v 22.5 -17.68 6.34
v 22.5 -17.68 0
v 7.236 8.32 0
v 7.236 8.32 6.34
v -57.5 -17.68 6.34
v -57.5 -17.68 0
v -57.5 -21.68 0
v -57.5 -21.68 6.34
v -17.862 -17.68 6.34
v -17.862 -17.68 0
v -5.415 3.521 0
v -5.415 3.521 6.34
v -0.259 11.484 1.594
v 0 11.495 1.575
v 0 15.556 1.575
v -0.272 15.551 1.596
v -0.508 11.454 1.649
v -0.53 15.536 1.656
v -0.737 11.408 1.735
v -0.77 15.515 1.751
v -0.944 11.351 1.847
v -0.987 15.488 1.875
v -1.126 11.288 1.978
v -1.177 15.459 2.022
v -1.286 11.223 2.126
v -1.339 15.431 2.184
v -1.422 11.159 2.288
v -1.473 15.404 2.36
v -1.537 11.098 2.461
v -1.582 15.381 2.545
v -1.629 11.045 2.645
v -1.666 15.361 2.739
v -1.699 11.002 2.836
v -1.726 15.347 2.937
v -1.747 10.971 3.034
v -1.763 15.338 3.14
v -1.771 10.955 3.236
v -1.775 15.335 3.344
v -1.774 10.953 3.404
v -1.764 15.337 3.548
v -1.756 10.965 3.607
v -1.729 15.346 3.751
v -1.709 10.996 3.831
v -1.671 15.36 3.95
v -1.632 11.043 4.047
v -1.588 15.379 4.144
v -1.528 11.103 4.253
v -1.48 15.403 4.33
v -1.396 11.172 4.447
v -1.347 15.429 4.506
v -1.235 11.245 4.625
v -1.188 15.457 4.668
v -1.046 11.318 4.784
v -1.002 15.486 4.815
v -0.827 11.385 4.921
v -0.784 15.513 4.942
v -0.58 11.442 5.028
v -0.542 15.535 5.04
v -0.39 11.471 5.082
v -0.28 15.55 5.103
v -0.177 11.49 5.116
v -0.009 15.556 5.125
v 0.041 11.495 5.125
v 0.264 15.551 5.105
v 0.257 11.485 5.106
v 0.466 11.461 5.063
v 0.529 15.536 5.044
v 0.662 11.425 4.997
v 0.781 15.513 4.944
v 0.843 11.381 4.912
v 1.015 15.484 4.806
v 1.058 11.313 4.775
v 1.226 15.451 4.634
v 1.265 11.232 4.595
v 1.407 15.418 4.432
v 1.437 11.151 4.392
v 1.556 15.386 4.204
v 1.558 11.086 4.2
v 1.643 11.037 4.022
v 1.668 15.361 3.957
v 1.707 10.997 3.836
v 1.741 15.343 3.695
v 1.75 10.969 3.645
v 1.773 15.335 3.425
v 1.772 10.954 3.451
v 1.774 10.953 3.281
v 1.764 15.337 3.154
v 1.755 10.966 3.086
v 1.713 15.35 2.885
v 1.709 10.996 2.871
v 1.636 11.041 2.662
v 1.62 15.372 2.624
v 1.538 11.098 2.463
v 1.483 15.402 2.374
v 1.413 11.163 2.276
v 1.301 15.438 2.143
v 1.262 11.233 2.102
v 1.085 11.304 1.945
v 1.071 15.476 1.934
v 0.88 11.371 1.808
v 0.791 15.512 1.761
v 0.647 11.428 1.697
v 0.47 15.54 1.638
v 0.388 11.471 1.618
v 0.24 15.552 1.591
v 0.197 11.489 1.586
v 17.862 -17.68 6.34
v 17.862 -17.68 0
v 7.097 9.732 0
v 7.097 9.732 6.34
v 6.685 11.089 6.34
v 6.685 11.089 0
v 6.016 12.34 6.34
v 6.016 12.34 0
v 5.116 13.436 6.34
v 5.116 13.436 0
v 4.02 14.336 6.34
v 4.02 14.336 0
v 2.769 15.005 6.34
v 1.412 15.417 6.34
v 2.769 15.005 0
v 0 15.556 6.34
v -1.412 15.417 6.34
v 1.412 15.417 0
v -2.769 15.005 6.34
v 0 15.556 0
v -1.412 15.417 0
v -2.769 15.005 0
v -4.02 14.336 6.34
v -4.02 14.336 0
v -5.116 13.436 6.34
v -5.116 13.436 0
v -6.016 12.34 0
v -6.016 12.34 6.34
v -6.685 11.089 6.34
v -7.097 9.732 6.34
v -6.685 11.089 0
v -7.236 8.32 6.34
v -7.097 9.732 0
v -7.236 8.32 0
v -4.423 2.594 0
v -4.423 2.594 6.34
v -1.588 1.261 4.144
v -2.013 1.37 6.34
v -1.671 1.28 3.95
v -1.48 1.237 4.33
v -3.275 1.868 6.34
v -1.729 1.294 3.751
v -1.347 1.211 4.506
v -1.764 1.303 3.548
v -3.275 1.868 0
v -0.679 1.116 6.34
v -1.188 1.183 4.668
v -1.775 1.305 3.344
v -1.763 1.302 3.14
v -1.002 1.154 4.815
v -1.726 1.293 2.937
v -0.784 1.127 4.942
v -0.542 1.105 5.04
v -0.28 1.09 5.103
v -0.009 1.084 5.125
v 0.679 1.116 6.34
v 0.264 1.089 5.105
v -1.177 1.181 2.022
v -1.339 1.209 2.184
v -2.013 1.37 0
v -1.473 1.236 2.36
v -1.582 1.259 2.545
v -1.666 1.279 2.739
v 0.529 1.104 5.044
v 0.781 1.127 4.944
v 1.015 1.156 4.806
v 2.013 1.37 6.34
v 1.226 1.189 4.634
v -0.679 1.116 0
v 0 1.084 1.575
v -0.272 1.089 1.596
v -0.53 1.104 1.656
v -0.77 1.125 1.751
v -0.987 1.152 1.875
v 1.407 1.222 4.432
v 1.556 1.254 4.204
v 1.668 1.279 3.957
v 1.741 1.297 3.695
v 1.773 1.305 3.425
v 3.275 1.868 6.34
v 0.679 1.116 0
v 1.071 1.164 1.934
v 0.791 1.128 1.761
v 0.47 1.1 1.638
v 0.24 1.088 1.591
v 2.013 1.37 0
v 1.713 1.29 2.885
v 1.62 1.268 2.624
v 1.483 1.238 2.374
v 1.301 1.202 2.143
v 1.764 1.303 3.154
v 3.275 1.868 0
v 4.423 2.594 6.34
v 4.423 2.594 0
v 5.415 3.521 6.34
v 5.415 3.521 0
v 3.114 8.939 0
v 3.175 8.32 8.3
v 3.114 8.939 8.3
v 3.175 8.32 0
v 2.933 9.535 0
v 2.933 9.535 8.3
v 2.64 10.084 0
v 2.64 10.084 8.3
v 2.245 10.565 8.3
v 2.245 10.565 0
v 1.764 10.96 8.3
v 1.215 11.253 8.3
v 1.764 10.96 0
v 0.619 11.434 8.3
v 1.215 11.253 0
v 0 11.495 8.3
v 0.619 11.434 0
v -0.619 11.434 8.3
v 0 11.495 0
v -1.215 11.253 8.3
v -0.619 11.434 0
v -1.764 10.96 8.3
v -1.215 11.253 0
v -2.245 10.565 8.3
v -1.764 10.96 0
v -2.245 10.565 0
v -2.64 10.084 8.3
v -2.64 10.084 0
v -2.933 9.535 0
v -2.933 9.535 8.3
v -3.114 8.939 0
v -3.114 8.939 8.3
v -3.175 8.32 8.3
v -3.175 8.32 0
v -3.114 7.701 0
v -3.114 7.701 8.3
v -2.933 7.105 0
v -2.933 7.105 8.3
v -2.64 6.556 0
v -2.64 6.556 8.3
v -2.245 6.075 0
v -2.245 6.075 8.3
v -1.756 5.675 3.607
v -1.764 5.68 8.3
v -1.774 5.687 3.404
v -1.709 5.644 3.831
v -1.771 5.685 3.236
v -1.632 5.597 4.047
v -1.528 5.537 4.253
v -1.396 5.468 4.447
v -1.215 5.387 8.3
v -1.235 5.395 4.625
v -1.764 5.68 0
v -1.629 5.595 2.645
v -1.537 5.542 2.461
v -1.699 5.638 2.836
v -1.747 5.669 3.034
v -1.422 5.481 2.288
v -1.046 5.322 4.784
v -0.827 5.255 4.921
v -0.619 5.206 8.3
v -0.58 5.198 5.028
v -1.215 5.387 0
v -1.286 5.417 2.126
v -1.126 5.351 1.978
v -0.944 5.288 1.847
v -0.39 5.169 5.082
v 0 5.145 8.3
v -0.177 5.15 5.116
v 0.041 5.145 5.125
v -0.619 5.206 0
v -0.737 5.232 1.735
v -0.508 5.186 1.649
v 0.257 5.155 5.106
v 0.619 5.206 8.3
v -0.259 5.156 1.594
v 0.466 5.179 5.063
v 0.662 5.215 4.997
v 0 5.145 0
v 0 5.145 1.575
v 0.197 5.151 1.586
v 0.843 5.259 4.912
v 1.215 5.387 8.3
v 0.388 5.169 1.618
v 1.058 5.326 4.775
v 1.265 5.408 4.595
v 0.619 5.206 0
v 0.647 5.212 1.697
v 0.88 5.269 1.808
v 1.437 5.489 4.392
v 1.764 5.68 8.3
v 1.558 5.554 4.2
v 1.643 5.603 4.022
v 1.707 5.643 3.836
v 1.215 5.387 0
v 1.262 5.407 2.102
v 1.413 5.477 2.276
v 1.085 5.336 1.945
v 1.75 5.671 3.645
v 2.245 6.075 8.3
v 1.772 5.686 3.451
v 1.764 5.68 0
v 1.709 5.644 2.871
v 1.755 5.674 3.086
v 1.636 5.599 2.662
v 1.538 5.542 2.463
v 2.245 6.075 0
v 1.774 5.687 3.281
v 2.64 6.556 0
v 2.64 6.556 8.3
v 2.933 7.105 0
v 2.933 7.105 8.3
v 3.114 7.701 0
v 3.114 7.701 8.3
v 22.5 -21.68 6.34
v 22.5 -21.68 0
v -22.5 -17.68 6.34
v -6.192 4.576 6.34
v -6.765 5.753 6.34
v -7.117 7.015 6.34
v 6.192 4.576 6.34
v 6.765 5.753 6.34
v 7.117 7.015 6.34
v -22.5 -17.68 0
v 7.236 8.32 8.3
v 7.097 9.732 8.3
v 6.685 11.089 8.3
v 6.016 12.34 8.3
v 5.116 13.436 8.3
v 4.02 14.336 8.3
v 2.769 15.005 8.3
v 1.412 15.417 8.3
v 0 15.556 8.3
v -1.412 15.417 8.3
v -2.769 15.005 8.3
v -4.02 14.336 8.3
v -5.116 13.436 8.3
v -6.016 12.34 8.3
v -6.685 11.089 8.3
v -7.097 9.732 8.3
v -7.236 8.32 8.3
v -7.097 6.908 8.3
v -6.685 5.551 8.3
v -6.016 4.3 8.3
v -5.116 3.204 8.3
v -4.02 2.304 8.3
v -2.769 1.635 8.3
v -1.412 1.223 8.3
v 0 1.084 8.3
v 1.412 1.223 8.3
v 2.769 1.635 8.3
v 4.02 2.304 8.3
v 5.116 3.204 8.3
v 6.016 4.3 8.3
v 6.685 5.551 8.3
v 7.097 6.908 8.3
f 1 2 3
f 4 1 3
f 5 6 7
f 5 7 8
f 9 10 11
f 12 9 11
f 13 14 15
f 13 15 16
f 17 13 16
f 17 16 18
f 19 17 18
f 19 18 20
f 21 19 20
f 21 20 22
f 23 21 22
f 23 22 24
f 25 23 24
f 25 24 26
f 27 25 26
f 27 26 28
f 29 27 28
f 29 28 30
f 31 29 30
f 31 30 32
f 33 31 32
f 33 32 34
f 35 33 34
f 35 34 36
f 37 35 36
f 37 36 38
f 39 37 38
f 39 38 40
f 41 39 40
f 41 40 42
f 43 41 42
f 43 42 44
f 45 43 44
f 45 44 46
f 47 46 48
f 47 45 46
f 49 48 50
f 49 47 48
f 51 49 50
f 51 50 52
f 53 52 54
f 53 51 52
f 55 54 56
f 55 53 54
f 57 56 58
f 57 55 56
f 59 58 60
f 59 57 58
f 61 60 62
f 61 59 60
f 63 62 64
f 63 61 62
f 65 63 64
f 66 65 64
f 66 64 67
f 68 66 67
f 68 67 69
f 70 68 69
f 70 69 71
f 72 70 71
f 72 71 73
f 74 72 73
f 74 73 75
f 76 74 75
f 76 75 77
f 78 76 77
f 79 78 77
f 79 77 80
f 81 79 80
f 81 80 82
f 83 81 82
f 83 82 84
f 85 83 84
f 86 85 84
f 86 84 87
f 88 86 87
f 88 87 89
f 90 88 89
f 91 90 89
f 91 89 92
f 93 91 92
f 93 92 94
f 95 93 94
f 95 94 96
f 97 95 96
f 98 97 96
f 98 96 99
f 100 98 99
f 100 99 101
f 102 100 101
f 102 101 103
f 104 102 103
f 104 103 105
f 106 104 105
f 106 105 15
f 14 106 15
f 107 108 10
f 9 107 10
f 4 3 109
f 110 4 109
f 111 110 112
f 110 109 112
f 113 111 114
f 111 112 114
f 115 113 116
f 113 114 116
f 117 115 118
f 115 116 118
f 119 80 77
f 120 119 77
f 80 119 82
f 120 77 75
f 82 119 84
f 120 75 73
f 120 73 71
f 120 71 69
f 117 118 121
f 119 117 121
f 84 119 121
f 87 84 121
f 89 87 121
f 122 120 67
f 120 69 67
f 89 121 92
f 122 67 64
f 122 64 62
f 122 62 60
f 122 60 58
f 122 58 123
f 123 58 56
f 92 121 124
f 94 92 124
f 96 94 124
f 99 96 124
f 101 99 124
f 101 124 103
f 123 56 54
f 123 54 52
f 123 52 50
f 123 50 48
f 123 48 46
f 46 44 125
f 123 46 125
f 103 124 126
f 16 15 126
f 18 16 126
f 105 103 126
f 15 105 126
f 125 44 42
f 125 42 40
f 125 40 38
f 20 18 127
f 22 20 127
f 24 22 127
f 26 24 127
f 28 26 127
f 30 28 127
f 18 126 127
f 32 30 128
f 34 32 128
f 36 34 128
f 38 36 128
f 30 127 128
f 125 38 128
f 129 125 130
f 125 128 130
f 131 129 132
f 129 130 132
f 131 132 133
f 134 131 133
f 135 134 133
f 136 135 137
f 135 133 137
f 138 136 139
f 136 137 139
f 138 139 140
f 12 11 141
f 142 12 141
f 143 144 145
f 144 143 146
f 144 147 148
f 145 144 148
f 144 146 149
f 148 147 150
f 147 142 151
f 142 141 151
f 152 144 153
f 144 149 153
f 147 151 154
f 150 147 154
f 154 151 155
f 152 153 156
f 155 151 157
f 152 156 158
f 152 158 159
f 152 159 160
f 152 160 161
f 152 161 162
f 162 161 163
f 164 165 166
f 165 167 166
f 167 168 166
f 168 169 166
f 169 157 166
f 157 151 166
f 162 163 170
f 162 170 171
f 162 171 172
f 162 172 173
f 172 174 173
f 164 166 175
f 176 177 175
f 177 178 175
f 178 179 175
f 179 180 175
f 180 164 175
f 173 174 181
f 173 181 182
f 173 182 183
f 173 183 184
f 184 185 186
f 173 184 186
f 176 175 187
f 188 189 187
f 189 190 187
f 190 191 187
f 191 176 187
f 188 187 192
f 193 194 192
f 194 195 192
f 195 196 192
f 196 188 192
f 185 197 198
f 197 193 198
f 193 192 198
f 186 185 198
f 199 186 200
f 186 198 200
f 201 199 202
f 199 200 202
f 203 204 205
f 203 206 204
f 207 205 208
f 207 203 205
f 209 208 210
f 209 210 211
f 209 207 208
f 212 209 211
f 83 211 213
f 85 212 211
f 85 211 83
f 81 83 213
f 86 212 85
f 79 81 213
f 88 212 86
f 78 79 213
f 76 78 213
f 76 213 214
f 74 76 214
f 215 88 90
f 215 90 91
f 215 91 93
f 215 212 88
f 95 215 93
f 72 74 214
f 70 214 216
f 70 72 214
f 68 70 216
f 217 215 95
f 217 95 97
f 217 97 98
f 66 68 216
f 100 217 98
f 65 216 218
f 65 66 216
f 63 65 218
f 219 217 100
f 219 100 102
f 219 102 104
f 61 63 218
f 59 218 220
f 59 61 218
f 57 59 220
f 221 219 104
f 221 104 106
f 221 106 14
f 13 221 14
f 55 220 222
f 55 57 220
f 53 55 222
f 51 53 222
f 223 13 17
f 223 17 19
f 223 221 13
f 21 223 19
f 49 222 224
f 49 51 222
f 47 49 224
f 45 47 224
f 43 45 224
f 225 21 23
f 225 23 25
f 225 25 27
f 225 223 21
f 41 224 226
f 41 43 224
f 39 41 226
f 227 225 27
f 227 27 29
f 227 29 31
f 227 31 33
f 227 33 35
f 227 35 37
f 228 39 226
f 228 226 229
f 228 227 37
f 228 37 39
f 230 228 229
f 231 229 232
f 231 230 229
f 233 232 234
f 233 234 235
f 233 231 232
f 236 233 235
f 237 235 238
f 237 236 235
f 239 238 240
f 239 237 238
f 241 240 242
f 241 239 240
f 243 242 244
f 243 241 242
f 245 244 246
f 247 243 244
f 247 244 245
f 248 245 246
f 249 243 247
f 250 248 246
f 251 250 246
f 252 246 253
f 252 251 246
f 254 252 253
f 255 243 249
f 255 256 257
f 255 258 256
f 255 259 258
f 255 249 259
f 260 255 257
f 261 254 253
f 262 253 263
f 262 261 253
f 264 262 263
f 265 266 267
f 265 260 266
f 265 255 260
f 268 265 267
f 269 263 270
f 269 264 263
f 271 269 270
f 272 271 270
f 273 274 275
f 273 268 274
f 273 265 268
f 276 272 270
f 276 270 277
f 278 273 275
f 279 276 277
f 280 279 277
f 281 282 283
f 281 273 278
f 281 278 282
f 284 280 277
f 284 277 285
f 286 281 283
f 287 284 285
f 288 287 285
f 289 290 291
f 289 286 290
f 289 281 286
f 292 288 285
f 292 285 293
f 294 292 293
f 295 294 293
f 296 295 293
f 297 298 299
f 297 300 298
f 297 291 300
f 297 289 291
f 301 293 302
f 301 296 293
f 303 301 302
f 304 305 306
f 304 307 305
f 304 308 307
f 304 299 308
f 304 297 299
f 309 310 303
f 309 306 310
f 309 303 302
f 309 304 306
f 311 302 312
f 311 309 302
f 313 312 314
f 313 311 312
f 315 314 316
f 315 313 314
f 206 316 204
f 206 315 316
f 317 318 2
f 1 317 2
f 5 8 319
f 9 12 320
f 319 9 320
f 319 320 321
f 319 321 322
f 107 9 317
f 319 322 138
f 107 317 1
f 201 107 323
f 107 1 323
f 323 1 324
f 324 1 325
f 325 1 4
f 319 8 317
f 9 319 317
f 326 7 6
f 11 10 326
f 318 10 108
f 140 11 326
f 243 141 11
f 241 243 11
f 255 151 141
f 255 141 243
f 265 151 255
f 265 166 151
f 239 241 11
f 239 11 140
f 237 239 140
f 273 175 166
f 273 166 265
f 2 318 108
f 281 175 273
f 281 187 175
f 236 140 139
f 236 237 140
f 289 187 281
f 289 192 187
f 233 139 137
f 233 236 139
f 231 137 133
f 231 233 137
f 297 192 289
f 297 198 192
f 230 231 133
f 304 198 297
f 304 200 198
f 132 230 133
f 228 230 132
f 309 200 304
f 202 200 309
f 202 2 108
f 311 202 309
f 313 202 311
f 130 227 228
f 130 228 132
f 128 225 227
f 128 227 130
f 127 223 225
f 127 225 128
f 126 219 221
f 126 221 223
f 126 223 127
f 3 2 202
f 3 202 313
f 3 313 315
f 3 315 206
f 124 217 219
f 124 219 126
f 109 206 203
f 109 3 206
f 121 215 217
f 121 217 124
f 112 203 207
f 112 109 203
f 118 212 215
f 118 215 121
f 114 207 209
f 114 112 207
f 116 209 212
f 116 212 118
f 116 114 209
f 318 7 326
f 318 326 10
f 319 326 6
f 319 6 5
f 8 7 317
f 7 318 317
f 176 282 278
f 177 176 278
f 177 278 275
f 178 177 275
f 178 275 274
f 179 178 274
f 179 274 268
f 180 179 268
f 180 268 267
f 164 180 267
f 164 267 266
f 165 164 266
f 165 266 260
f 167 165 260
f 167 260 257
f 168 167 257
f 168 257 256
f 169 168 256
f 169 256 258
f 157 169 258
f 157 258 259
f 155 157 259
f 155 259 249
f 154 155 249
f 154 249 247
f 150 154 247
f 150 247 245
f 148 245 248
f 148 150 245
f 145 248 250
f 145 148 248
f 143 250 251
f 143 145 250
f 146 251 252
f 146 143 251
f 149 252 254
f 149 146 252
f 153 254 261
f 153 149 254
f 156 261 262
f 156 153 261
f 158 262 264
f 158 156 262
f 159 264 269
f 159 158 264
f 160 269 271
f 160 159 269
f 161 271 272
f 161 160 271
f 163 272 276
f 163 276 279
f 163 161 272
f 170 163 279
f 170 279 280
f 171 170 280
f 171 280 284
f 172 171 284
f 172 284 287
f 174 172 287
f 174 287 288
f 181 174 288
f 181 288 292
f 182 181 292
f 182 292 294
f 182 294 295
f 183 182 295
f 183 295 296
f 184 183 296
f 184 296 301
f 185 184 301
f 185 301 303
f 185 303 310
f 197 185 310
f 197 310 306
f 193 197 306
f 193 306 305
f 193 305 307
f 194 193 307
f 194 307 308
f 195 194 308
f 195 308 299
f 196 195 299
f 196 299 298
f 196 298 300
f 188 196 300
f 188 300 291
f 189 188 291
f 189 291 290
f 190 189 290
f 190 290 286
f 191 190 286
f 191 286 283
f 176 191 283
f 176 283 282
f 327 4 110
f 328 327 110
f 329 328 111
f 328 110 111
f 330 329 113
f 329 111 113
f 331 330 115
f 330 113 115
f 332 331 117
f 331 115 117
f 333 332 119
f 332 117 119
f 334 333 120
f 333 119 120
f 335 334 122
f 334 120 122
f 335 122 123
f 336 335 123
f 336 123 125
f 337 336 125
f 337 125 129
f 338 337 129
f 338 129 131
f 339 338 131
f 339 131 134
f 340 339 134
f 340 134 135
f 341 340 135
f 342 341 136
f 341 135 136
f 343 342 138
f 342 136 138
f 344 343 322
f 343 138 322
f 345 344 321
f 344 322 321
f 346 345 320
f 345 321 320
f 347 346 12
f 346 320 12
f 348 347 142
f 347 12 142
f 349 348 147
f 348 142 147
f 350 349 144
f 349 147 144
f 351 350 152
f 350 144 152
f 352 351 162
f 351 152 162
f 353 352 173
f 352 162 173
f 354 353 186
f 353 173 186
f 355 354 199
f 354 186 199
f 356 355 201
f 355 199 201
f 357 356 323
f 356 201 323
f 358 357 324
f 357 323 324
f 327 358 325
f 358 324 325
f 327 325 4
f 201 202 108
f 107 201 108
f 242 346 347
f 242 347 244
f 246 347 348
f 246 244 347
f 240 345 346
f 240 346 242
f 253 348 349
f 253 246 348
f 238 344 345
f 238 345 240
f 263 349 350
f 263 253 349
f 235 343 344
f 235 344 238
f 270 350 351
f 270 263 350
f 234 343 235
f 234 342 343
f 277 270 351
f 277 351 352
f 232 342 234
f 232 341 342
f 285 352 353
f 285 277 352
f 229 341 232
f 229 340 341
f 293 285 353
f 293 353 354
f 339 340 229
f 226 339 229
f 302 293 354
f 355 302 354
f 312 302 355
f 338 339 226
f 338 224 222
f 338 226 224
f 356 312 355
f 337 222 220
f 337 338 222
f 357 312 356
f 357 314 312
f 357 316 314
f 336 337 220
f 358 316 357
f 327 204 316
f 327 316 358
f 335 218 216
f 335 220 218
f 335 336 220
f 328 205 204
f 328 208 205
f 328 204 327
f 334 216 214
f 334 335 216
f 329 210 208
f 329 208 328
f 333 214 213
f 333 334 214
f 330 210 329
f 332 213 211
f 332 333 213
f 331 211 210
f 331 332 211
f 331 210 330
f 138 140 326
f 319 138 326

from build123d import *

# Parameters (mm, degrees)
SKETCH1_R               = 3.175
BOSS_EXTRUDE1_DEPTH     = 6.34
CUT_EXTRUDE1_DEPTH      = 4.34
CUT_EXTRUDE1_DEPTH_BACK = 18.34
SKETCH2_R               = 1.775
SKETCH5_R               = 7.235705293
SKETCH5_R_2             = 3.175
BOSS_EXTRUDE2_DEPTH     = 1.96
SKETCH6_W               = 6.34
SKETCH6_H               = 4
BOSS_EXTRUDE3_DEPTH     = 35


with BuildPart() as part:
    # Sketch1 → Boss-Extrude1 (new body)
    with BuildSketch(Plane.XY):
        with BuildLine():
            Line((-7.235705295, 8.319966171), (-22.5, -17.680033829))
            Line((-22.5, -17.680033829), (-22.5, -21.680033829))
            Line((-22.5, -21.680033829), (22.5, -21.680033829))
            Line((22.5, -21.680033829), (22.5, -17.680033829))
            Line((22.5, -17.680033829), (7.235705295, 8.319966171))
            ThreePointArc((7.235705293, 8.319966171), (0, 15.555671463), (-7.235705293, 8.319966171))
        make_face()
        with BuildLine():
            Line((-17.861599202, -17.680033829), (-5.414947439, 3.520614619))
            ThreePointArc((-5.414947439, 3.520614619), (0, 1.084260878), (5.414947439, 3.520614619))
            Line((5.414947439, 3.520614619), (17.861599202, -17.680033829))
            Line((17.861599202, -17.680033829), (-17.861599202, -17.680033829))
        make_face(mode=Mode.SUBTRACT)
        with Locations((0, 8.319966171)):
            Circle(SKETCH1_R, mode=Mode.SUBTRACT)
    extrude(amount=BOSS_EXTRUDE1_DEPTH)

    # Sketch2 → Cut-Extrude1 (cut, two sides: drawn at the far end of the back side and taken through both)
    with BuildSketch(Plane(origin=(0, 14.319966171, 0), x_dir=(1, 0, 0), z_dir=(0, 1, 0)).offset(-CUT_EXTRUDE1_DEPTH_BACK)):
        with Locations(Location((0, -3.35, 0), (0, 0, 90))):
            Circle(SKETCH2_R)
    extrude(amount=CUT_EXTRUDE1_DEPTH + CUT_EXTRUDE1_DEPTH_BACK, mode=Mode.SUBTRACT)

    # Sketch5 → Boss-Extrude2 (add)
    with BuildSketch(Plane.XY.offset(6.34)):
        with Locations((0, 8.319966171)):
            Circle(SKETCH5_R)
        with Locations((0, 8.319966171)):
            Circle(SKETCH5_R_2, mode=Mode.SUBTRACT)
    extrude(amount=BOSS_EXTRUDE2_DEPTH)

    # Sketch6 → Boss-Extrude3 (add)
    with BuildSketch(Plane.ZY.offset(22.5)):
        with Locations((3.17, -19.680033829)):
            Rectangle(SKETCH6_W, SKETCH6_H)
    extrude(amount=BOSS_EXTRUDE3_DEPTH)


solid = part.part
